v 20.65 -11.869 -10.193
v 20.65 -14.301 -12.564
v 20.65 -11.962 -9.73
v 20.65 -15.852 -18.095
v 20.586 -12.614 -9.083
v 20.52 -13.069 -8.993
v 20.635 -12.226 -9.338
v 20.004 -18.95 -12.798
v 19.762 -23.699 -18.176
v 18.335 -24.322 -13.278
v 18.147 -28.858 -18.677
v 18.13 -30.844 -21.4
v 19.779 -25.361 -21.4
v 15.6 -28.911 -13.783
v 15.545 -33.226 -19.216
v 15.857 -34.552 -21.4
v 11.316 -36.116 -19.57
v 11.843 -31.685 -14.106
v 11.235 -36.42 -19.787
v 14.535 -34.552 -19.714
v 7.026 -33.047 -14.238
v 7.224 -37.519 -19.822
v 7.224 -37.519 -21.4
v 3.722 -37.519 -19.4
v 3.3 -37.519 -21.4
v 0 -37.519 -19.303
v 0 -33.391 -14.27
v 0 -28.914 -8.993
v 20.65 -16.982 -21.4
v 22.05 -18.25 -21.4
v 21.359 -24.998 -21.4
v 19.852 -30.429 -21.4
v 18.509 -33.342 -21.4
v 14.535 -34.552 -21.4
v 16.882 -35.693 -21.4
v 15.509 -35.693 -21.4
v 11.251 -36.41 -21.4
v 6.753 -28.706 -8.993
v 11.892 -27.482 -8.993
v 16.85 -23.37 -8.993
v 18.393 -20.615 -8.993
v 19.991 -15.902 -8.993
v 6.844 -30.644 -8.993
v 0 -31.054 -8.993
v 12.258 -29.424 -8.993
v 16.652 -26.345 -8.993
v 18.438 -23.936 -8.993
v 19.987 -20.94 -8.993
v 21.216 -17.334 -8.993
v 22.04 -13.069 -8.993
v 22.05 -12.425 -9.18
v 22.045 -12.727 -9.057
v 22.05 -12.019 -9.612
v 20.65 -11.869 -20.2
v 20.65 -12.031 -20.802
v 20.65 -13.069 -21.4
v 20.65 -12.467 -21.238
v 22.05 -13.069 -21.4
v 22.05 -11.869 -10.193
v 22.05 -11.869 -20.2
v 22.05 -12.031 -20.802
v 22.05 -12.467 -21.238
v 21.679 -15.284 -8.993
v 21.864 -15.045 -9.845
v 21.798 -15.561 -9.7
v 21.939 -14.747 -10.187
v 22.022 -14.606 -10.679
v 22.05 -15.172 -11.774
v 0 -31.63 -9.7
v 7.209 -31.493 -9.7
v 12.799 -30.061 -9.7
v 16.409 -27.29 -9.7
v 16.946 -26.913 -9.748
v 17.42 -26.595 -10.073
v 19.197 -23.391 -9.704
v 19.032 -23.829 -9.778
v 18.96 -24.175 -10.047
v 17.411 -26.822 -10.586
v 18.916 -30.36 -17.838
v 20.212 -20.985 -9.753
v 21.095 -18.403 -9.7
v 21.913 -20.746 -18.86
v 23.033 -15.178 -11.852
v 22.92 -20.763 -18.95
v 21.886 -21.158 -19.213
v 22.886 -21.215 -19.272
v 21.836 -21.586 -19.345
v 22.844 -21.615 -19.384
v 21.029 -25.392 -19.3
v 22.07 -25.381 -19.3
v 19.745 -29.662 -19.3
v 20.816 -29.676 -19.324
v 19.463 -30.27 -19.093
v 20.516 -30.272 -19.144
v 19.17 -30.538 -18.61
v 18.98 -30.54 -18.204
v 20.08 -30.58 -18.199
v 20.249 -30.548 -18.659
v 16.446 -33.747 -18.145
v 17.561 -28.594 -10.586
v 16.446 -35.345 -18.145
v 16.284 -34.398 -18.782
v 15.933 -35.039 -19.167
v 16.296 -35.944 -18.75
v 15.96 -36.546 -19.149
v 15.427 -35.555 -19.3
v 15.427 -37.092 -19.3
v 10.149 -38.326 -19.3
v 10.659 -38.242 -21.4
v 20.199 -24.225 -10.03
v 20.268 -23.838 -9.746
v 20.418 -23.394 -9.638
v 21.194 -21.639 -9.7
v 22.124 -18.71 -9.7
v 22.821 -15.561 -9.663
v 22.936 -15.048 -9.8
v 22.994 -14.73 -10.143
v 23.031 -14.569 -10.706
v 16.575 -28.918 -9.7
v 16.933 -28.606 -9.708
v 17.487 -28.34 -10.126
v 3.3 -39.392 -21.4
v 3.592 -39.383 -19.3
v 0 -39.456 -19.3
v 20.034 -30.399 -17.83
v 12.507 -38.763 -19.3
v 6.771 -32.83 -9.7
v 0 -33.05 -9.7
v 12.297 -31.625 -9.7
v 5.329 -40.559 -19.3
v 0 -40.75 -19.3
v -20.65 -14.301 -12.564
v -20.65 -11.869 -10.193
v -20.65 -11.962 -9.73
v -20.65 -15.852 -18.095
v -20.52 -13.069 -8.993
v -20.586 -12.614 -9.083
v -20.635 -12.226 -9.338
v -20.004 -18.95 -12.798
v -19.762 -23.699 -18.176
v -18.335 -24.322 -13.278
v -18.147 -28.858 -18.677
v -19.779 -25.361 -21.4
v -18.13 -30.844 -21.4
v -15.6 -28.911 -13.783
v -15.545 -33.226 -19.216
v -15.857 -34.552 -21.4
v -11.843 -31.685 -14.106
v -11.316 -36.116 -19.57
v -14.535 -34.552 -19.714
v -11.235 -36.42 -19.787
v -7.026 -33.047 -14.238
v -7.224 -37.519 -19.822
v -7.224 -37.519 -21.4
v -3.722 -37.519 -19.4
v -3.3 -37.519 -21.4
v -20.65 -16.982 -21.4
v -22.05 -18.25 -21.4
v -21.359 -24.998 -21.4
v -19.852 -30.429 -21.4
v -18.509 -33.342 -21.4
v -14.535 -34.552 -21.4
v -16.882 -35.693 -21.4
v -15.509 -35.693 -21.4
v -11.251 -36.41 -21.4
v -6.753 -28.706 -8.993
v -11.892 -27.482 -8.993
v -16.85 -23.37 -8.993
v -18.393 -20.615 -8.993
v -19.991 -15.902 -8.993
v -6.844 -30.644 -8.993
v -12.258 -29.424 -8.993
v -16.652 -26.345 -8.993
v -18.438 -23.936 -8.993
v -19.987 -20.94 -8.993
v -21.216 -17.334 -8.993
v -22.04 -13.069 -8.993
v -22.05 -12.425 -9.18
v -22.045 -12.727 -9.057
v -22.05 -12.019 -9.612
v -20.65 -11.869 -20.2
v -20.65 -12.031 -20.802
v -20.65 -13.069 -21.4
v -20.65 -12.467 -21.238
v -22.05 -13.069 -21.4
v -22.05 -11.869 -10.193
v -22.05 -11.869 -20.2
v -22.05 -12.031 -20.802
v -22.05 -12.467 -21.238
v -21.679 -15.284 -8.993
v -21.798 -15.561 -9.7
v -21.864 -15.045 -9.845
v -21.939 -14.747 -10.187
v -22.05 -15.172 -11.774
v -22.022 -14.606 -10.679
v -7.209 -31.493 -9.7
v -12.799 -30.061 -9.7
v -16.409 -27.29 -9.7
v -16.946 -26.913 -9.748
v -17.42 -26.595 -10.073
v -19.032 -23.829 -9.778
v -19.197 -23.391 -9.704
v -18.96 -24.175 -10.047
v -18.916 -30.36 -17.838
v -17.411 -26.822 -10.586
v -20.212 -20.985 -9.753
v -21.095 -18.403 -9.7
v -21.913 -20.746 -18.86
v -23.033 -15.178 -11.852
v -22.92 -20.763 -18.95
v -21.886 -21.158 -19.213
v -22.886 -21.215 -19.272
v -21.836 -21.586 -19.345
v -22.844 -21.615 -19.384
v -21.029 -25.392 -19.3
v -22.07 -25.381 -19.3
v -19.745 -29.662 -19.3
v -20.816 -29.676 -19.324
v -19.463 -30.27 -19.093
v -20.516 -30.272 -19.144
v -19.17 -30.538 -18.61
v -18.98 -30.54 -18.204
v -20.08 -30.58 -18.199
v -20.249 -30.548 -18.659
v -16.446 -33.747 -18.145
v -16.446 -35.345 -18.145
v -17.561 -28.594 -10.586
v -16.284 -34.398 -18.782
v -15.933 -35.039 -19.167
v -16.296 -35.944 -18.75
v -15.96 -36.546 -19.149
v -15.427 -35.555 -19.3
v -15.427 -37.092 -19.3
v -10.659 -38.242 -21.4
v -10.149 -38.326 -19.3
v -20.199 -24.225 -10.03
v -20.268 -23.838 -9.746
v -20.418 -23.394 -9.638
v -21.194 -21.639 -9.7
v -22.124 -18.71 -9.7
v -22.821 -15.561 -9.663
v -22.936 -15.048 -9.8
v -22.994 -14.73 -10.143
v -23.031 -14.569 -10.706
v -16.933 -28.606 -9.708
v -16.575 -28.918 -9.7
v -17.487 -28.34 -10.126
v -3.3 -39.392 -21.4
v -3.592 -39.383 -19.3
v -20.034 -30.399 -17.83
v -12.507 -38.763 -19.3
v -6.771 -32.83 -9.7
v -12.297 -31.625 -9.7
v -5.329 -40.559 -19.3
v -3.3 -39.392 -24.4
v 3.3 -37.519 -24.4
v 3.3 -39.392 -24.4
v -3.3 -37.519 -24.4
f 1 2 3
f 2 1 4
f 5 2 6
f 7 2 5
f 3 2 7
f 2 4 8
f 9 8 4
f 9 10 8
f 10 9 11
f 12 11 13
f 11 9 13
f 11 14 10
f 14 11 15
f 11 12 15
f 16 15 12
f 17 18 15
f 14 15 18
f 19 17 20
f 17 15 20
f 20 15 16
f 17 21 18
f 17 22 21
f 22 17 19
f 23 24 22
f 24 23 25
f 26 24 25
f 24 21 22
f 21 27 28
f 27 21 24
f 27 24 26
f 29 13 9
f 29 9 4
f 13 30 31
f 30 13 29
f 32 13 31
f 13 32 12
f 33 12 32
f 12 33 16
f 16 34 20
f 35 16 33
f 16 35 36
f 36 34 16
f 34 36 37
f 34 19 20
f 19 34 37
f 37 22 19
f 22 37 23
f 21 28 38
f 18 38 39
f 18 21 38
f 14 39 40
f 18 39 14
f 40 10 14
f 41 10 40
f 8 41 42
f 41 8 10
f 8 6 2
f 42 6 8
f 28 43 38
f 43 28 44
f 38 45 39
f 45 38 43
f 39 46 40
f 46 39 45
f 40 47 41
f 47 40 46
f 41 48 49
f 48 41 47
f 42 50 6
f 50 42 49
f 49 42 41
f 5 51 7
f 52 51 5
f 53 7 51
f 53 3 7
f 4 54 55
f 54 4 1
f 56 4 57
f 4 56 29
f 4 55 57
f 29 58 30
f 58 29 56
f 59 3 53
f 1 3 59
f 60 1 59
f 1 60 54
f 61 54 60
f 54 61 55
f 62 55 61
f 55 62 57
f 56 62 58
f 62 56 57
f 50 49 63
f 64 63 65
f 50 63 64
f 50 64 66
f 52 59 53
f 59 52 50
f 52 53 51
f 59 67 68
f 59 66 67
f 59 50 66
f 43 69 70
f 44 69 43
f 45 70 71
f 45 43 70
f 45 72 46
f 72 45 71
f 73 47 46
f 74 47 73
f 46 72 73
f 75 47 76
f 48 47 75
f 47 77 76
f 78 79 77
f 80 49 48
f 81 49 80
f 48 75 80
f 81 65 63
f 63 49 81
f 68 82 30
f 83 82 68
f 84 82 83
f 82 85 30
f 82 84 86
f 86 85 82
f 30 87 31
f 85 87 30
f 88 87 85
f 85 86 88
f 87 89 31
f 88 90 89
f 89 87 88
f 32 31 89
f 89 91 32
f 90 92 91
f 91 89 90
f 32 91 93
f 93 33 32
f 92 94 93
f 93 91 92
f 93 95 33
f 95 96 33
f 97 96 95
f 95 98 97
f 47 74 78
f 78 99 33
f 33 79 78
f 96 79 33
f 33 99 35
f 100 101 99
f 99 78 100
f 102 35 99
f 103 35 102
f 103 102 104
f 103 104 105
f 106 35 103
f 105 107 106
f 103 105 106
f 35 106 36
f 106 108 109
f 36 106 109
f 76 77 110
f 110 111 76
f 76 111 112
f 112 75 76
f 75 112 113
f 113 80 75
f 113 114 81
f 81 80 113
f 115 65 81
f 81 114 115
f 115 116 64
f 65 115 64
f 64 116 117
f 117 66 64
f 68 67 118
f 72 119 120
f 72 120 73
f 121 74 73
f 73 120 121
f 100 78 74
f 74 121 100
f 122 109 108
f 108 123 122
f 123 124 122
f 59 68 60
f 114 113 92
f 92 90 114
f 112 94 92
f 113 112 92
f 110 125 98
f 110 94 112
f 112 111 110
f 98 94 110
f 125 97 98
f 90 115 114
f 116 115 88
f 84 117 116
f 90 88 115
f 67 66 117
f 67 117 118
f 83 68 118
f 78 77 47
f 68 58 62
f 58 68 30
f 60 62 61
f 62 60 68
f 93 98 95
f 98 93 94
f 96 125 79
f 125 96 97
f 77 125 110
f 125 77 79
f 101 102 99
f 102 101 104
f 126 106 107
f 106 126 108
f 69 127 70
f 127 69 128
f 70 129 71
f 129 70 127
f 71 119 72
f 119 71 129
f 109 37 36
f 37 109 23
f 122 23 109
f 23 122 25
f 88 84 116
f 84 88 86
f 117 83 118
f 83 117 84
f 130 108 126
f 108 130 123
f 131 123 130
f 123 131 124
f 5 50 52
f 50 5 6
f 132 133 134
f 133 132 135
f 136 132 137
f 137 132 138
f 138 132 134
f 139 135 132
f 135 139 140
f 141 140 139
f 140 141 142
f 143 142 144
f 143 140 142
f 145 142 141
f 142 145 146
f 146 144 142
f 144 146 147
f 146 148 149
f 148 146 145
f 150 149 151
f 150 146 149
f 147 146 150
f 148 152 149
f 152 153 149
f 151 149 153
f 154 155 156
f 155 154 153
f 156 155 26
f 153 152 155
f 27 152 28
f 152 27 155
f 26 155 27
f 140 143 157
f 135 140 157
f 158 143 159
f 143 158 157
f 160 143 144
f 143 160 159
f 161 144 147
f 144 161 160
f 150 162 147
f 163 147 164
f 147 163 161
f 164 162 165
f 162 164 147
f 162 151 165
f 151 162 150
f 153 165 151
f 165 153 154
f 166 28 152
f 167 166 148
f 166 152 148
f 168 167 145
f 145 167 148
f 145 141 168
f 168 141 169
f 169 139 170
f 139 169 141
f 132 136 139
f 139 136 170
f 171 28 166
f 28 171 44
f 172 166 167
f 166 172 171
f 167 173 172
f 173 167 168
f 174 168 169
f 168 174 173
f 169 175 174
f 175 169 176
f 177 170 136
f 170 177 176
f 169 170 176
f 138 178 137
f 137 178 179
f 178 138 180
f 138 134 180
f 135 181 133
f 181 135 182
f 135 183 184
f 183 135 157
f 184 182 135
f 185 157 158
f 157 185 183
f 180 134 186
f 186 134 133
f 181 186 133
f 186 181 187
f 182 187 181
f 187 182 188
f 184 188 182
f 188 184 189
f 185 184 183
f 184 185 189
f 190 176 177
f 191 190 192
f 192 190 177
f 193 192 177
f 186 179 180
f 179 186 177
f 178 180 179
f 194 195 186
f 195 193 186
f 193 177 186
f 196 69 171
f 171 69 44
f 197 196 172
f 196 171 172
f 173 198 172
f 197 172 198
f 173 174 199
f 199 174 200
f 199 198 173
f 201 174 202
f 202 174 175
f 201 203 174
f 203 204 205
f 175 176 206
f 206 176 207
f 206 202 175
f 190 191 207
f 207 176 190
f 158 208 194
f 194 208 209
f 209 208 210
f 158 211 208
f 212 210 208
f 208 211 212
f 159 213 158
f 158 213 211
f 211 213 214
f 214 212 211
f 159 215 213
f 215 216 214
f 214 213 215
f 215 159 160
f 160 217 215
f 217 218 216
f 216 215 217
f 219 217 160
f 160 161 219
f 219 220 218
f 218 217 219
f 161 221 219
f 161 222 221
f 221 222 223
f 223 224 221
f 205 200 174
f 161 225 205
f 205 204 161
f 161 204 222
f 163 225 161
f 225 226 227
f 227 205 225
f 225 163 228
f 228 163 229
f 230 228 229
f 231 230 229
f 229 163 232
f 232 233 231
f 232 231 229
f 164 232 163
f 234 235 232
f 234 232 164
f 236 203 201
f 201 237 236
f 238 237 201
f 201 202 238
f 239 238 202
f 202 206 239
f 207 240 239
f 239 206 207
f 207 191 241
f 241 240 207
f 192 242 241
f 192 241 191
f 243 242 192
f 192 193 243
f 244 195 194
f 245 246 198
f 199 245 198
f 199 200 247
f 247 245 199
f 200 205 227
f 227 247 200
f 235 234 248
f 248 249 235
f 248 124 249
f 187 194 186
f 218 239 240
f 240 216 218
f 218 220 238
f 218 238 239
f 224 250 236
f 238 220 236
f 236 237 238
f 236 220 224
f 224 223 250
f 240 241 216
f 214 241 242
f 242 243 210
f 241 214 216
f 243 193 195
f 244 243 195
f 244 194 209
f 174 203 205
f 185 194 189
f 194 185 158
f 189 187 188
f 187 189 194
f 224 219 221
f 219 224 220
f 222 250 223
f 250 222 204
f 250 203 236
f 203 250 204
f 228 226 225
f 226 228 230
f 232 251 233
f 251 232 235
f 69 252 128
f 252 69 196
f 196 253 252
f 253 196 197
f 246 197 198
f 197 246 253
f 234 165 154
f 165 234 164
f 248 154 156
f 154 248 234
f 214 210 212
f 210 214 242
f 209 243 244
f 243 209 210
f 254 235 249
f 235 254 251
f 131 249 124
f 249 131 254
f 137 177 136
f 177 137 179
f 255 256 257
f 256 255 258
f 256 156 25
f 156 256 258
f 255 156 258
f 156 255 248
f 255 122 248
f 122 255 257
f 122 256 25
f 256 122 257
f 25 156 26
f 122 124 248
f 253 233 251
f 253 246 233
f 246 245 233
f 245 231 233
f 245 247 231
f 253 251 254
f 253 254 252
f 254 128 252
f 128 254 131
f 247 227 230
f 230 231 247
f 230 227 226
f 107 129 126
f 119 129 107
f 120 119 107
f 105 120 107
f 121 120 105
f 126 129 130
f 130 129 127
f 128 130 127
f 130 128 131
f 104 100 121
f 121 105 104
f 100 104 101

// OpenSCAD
use <../lib.scad>
use <s/87612s01.scad>
use <s/87612s03.scad>
function ldraw_lib__87612() = [
// 0 Glass for Plane Front  6 x 10 x  4
// 0 Name: 87612.dat
// 0 Author: Magnus Forsberg [MagFors]
// 0 !LDRAW_ORG Part UPDATE 2023-06
// 0 !LICENSE Licensed under CC BY 4.0 : see CAreadme.txt
// 
// 0 BFC CERTIFY CCW
  [0,"BFC","CERTIFY"],
  [0,"BFC","CCW"],
// 
// 0 !CATEGORY Plane
// 0 !KEYWORDS windscreen
// 
// 0 !HISTORY 2011-09-11 {LEGO Digital Designer} Original part shape
// 0 !HISTORY 2011-09-12 [MagFors] File preparation for LDraw Parts Tracker
// 0 !HISTORY 2012-03-30 [PTadmin] Official Update 2012-01
// 0 !HISTORY 2021-11-13 [MagFors] Subfiled
// 0 !HISTORY 2023-11-19 [OrionP] Official Update 2023-06
// 
// 
// 1 16 0 0 0 1 0 0 0 1 0 0 0 1 s\87612s01.dat
  [1,16,0,0,0,1,0,0,0,1,0,0,0,1, ldraw_lib__s__87612s01()],
// 1 16 0 0 0 1 0 0 0 1 0 0 0 1 s\87612s03.dat
  [1,16,0,0,0,1,0,0,0,1,0,0,0,1, ldraw_lib__s__87612s03()],
];
module ldraw_lib__87612(step=0, col=false, unit=2/5, alt=false, line=0.2, solid=!$preview)
    makepoly(ldraw_lib__87612(), step=step, col=col, unit=unit, alt=alt, line=line, solid=solid);
ldraw_lib__87612(line=0.2);
